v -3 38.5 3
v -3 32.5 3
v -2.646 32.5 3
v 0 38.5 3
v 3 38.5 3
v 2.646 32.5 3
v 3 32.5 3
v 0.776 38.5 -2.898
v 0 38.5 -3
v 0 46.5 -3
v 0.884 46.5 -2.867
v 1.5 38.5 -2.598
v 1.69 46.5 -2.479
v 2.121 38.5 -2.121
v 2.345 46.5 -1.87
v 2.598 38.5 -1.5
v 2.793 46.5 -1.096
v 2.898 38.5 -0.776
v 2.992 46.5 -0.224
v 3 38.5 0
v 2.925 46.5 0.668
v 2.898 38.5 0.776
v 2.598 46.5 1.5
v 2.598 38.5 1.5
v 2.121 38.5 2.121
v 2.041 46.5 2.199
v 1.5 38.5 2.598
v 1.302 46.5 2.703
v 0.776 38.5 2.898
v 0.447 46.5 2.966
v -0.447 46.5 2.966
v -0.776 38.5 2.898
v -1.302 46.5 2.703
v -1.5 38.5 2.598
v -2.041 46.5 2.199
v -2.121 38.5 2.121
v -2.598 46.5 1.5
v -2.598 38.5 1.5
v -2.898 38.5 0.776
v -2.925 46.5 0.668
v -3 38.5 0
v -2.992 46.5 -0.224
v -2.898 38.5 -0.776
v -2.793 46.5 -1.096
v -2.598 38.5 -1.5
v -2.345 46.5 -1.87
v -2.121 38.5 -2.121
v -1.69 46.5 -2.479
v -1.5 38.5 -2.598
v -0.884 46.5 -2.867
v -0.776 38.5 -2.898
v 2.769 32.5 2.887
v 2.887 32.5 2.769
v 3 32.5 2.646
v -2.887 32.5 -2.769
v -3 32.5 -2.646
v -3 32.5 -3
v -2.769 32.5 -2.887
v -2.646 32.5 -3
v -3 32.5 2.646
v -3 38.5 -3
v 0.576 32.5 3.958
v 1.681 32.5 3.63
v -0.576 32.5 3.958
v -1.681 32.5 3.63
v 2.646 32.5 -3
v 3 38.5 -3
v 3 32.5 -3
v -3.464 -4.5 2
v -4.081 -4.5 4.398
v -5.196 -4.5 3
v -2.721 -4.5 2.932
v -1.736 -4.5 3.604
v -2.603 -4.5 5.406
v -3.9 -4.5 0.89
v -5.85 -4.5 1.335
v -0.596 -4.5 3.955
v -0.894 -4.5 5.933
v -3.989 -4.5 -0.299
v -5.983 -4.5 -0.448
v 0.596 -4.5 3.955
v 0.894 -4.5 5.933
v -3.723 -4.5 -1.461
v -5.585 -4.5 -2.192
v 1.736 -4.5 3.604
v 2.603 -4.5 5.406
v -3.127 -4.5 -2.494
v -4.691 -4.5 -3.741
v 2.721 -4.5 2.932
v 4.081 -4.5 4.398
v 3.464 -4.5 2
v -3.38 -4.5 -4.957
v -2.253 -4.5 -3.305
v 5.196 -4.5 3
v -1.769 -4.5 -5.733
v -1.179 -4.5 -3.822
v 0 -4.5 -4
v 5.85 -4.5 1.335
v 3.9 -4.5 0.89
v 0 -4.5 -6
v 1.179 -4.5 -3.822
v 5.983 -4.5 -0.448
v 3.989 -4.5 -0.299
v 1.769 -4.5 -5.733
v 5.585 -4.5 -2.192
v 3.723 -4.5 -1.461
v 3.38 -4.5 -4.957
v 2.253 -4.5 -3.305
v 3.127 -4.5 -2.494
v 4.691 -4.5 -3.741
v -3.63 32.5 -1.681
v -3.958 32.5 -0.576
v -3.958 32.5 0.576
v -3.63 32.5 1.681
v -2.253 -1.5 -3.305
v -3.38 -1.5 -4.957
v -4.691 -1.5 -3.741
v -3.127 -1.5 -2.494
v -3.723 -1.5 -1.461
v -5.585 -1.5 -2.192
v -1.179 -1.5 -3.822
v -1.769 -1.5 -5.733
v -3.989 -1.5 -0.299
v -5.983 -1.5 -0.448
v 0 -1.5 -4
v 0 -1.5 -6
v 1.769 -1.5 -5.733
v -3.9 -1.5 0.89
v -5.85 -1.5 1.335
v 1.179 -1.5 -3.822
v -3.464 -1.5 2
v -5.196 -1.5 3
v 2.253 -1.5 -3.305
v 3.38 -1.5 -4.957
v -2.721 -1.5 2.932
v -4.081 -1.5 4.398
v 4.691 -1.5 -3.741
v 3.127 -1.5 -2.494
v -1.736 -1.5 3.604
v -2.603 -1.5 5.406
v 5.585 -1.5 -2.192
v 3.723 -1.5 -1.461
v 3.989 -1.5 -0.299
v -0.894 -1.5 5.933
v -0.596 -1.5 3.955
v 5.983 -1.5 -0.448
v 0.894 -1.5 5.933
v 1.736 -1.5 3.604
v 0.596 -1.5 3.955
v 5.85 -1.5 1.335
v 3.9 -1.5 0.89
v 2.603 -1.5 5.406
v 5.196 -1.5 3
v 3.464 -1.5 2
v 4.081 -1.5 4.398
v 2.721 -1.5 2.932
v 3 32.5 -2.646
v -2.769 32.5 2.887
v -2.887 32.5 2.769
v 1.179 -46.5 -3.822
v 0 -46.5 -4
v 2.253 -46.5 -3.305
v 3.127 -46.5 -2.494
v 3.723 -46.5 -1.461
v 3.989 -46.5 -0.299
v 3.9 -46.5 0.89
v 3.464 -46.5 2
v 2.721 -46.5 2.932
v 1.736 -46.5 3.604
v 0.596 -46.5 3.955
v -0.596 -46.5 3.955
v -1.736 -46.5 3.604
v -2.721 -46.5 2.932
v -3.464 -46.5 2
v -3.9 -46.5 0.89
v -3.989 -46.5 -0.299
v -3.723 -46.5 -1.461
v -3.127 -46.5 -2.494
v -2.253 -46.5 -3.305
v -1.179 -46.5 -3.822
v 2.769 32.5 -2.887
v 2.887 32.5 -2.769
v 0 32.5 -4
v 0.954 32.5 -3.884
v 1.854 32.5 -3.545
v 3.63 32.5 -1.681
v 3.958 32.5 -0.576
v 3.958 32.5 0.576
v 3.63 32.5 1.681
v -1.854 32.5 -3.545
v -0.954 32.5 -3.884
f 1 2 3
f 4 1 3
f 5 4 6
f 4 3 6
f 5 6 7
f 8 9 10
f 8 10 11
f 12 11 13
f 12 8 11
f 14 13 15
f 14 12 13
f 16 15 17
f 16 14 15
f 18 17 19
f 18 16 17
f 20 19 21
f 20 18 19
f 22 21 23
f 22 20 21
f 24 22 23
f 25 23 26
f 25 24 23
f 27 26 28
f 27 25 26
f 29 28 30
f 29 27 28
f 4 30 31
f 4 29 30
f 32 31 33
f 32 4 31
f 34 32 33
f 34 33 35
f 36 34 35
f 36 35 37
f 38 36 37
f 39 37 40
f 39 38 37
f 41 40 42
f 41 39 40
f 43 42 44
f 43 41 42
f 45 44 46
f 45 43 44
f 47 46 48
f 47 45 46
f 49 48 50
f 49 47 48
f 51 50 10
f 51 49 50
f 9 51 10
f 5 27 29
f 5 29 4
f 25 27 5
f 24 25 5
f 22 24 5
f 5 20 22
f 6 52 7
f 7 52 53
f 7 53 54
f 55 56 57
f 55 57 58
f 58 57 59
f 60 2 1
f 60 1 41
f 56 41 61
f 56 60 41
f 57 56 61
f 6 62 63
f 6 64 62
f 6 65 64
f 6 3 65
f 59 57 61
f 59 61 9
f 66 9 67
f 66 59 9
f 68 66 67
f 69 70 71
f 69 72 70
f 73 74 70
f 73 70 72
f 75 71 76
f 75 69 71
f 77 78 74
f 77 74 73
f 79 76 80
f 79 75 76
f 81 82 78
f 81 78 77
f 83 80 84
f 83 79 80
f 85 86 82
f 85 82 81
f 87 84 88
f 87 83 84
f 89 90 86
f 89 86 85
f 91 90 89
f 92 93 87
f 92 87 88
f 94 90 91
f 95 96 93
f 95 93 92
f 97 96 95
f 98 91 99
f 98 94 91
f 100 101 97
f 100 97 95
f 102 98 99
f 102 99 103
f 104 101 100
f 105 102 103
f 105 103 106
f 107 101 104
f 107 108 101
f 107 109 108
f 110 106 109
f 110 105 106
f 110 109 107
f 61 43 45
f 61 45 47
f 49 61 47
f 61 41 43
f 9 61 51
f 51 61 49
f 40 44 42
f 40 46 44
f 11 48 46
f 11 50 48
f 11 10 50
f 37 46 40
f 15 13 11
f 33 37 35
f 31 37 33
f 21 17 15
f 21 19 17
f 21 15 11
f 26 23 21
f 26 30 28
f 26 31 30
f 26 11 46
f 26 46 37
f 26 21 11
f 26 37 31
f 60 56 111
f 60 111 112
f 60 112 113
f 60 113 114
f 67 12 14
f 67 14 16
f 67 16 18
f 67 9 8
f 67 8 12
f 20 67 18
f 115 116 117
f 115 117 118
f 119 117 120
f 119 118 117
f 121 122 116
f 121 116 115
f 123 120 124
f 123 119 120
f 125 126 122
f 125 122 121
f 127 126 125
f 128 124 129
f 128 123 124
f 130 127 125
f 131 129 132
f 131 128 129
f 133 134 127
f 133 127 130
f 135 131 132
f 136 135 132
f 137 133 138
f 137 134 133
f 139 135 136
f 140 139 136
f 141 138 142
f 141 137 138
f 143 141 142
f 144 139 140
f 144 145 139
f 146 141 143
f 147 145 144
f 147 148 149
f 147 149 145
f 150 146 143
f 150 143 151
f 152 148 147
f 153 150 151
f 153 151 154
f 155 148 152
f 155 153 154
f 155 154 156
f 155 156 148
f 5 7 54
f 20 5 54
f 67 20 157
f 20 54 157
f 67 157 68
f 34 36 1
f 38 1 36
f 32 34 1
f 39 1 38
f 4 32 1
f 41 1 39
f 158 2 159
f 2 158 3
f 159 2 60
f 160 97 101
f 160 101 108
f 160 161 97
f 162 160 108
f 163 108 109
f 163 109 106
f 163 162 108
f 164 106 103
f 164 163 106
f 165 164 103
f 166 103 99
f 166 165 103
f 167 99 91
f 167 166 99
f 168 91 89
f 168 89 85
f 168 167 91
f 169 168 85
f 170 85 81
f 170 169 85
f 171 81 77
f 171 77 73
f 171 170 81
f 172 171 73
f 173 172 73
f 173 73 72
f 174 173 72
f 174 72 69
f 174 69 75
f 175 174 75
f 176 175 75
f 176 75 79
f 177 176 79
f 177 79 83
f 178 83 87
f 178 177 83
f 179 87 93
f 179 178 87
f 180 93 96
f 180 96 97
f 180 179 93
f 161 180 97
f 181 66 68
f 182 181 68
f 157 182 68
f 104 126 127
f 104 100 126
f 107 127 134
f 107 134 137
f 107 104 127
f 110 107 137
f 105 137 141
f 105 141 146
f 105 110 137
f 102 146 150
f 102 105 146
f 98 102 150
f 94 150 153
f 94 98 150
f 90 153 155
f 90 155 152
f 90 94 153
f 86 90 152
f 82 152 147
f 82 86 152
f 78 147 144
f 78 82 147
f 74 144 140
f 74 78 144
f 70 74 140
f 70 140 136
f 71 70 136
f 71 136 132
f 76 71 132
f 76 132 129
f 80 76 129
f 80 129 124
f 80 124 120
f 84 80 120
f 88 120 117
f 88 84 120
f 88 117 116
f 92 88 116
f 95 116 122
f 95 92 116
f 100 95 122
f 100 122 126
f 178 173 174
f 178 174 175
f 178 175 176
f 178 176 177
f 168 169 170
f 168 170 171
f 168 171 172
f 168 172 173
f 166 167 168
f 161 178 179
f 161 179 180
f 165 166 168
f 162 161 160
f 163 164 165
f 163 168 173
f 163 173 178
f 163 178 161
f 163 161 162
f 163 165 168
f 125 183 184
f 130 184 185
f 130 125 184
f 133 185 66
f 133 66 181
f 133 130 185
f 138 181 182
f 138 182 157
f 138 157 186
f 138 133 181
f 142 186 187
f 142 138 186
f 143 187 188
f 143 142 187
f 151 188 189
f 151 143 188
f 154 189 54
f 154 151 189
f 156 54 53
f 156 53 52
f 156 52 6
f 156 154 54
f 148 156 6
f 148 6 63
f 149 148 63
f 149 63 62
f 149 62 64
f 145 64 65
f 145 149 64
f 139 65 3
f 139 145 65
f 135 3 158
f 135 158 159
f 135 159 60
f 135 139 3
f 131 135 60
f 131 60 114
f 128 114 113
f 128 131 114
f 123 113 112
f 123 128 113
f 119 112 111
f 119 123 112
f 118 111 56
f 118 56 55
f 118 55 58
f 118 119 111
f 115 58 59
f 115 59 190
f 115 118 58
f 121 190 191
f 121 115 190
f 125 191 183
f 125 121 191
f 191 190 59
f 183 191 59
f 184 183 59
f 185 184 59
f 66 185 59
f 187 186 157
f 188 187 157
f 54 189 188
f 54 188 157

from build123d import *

# Parameters (mm, degrees)
SKETCH2_W           = 6
SKETCH2_H           = 6
BOSS_EXTRUDE1_DEPTH = 6


with BuildPart() as part:
    # Sketch1 → Revolve1 (revolve)
    with BuildSketch(Plane(origin=(0, 0, 0), x_dir=(0, 0, -1), z_dir=(1, 0, 0))):
        Polygon((0, 46.5), (3, 46.5), (3, 32.5), (4, 32.5), (4, -1.5), (6, -1.5), (6, -4.5), (4, -4.5), (4, -46.5), (0, -46.5), align=None)
    revolve(axis=Axis((0, 46.5, 0), (0, -1, 0)))

    # Sketch2 → Boss-Extrude1 (add)
    with BuildSketch(Plane(origin=(0, 32.5, 0), x_dir=(1, 0, 0), z_dir=(0, 1, 0))):
        Rectangle(SKETCH2_W, SKETCH2_H)
    extrude(amount=BOSS_EXTRUDE1_DEPTH)


solid = part.part
